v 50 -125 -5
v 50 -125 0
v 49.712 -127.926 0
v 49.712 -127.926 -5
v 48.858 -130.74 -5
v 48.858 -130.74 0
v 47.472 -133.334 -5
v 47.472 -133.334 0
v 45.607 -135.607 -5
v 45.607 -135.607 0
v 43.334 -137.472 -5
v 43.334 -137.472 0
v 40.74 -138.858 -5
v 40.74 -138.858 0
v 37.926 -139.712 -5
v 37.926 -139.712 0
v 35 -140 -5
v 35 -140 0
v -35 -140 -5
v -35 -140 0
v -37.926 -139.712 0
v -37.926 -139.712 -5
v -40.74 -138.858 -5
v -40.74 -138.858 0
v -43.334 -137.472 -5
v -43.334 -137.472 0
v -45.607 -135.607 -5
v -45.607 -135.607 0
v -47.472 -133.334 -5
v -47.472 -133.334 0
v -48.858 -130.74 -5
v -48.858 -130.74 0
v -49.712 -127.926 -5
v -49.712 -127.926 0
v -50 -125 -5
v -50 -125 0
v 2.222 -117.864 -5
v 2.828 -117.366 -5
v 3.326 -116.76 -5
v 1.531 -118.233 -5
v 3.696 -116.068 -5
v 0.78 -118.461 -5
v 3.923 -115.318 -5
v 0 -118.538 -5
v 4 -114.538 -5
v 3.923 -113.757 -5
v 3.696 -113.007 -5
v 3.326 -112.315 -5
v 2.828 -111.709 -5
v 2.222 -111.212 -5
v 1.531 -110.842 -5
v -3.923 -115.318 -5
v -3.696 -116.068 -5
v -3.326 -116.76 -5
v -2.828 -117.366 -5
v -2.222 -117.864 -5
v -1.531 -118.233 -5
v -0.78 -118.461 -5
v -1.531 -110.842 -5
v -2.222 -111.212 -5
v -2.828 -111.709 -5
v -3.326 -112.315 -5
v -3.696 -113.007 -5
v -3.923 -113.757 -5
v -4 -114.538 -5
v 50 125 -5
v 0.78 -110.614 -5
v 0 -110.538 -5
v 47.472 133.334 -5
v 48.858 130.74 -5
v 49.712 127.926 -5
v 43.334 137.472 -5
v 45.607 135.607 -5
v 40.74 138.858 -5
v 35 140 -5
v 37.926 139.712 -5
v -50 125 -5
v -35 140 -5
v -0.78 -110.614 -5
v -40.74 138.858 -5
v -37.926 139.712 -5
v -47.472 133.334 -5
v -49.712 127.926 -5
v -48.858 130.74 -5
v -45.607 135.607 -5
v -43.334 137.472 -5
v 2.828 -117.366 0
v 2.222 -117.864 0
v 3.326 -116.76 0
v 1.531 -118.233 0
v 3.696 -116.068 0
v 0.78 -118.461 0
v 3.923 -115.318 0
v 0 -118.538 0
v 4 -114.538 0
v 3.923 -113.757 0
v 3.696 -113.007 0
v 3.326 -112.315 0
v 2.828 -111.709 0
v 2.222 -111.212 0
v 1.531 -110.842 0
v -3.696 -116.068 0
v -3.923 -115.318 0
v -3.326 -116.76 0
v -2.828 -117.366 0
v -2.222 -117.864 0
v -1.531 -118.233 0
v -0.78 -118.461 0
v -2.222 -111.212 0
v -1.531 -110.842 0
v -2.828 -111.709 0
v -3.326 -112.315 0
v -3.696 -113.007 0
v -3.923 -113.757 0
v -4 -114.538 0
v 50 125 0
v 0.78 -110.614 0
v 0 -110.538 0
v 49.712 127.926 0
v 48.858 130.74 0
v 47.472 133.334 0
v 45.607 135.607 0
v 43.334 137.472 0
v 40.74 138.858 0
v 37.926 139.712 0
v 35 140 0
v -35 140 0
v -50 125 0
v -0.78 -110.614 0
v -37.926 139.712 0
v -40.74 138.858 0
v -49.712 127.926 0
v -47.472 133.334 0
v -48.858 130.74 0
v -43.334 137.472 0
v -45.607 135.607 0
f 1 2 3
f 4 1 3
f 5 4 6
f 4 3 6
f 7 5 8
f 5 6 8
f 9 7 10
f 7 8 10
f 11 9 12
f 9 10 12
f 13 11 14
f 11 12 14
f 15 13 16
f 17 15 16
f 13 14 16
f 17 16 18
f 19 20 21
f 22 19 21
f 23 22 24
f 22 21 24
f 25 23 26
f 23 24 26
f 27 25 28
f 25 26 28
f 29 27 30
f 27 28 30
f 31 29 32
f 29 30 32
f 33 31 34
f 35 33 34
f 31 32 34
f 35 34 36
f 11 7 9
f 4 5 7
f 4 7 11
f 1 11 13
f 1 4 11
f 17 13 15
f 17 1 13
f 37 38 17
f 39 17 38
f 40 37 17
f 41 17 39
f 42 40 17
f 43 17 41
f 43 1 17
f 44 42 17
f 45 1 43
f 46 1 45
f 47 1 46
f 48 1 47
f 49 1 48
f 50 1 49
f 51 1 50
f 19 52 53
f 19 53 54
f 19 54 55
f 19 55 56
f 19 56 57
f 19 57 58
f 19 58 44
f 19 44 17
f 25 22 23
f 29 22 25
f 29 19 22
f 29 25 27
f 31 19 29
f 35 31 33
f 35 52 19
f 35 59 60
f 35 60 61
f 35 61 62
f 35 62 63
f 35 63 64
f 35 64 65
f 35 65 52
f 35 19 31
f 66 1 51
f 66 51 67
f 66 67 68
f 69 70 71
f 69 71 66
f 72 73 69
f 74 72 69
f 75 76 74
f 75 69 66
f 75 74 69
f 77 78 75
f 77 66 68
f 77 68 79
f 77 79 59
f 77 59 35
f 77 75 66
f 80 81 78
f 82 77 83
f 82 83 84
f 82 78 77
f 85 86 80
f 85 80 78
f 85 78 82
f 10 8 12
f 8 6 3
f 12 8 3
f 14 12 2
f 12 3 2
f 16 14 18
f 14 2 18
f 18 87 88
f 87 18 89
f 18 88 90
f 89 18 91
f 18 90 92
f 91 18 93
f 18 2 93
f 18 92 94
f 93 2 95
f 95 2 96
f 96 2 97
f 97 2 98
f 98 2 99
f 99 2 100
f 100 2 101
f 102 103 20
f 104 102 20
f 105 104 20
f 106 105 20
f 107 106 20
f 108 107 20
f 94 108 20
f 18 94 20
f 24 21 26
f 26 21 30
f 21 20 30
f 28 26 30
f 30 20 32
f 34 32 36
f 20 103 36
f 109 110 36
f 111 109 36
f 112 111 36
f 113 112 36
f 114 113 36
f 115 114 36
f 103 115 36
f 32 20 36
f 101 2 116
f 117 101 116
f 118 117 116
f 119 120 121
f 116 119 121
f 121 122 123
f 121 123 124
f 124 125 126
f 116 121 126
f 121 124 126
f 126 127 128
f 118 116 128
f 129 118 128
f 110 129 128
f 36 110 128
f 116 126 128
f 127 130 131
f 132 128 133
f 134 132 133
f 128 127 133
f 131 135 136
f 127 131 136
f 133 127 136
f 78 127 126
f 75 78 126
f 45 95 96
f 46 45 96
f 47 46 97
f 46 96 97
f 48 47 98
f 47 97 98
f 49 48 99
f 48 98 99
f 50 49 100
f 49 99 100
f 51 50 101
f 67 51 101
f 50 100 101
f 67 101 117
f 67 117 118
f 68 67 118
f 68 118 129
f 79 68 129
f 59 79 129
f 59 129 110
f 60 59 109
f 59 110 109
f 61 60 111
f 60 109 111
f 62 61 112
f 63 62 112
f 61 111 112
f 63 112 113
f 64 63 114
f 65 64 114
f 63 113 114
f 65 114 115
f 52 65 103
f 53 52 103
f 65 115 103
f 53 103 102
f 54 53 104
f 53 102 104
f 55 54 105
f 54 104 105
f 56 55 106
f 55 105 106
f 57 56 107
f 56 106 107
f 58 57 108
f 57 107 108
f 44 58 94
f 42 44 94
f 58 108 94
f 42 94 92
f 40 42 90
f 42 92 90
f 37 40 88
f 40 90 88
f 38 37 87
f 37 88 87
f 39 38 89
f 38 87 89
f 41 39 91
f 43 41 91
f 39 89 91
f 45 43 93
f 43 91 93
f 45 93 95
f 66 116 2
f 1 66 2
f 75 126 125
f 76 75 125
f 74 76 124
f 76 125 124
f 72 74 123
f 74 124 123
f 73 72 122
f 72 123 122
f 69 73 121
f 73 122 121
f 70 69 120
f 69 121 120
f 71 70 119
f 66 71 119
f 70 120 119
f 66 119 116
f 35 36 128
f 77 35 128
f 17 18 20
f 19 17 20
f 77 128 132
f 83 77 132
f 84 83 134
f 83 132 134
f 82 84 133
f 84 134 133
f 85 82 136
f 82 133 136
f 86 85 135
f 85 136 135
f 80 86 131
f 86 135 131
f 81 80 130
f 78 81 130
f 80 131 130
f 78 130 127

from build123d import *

# Parameters (mm, degrees)
SKETCH1_R          = 4
BASE_FLANGE1_DEPTH = 5


# Sheet-metal steps are written as plain solids
with BuildPart() as part:
    # Sketch1 → Base-Flange1 (new body)
    with BuildSketch(Plane.XY):
        with BuildLine():
            Line((-35, 140), (35, 140))
            ThreePointArc((35, 140), (45.606601718, 135.606601718), (50, 125))
            Line((50, 125), (50, -125))
            ThreePointArc((50, -125), (45.606601718, -135.606601718), (35, -140))
            Line((35, -140), (-35, -140))
            ThreePointArc((-35, -140), (-45.606601718, -135.606601718), (-50, -125))
            Line((-50, -125), (-50, 125))
            ThreePointArc((-50, 125), (-45.606601718, 135.606601718), (-35, 140))
        make_face()
        with Locations((0, -114.537631935)):
            Circle(SKETCH1_R, mode=Mode.SUBTRACT)
    extrude(amount=-BASE_FLANGE1_DEPTH)


solid = part.part
